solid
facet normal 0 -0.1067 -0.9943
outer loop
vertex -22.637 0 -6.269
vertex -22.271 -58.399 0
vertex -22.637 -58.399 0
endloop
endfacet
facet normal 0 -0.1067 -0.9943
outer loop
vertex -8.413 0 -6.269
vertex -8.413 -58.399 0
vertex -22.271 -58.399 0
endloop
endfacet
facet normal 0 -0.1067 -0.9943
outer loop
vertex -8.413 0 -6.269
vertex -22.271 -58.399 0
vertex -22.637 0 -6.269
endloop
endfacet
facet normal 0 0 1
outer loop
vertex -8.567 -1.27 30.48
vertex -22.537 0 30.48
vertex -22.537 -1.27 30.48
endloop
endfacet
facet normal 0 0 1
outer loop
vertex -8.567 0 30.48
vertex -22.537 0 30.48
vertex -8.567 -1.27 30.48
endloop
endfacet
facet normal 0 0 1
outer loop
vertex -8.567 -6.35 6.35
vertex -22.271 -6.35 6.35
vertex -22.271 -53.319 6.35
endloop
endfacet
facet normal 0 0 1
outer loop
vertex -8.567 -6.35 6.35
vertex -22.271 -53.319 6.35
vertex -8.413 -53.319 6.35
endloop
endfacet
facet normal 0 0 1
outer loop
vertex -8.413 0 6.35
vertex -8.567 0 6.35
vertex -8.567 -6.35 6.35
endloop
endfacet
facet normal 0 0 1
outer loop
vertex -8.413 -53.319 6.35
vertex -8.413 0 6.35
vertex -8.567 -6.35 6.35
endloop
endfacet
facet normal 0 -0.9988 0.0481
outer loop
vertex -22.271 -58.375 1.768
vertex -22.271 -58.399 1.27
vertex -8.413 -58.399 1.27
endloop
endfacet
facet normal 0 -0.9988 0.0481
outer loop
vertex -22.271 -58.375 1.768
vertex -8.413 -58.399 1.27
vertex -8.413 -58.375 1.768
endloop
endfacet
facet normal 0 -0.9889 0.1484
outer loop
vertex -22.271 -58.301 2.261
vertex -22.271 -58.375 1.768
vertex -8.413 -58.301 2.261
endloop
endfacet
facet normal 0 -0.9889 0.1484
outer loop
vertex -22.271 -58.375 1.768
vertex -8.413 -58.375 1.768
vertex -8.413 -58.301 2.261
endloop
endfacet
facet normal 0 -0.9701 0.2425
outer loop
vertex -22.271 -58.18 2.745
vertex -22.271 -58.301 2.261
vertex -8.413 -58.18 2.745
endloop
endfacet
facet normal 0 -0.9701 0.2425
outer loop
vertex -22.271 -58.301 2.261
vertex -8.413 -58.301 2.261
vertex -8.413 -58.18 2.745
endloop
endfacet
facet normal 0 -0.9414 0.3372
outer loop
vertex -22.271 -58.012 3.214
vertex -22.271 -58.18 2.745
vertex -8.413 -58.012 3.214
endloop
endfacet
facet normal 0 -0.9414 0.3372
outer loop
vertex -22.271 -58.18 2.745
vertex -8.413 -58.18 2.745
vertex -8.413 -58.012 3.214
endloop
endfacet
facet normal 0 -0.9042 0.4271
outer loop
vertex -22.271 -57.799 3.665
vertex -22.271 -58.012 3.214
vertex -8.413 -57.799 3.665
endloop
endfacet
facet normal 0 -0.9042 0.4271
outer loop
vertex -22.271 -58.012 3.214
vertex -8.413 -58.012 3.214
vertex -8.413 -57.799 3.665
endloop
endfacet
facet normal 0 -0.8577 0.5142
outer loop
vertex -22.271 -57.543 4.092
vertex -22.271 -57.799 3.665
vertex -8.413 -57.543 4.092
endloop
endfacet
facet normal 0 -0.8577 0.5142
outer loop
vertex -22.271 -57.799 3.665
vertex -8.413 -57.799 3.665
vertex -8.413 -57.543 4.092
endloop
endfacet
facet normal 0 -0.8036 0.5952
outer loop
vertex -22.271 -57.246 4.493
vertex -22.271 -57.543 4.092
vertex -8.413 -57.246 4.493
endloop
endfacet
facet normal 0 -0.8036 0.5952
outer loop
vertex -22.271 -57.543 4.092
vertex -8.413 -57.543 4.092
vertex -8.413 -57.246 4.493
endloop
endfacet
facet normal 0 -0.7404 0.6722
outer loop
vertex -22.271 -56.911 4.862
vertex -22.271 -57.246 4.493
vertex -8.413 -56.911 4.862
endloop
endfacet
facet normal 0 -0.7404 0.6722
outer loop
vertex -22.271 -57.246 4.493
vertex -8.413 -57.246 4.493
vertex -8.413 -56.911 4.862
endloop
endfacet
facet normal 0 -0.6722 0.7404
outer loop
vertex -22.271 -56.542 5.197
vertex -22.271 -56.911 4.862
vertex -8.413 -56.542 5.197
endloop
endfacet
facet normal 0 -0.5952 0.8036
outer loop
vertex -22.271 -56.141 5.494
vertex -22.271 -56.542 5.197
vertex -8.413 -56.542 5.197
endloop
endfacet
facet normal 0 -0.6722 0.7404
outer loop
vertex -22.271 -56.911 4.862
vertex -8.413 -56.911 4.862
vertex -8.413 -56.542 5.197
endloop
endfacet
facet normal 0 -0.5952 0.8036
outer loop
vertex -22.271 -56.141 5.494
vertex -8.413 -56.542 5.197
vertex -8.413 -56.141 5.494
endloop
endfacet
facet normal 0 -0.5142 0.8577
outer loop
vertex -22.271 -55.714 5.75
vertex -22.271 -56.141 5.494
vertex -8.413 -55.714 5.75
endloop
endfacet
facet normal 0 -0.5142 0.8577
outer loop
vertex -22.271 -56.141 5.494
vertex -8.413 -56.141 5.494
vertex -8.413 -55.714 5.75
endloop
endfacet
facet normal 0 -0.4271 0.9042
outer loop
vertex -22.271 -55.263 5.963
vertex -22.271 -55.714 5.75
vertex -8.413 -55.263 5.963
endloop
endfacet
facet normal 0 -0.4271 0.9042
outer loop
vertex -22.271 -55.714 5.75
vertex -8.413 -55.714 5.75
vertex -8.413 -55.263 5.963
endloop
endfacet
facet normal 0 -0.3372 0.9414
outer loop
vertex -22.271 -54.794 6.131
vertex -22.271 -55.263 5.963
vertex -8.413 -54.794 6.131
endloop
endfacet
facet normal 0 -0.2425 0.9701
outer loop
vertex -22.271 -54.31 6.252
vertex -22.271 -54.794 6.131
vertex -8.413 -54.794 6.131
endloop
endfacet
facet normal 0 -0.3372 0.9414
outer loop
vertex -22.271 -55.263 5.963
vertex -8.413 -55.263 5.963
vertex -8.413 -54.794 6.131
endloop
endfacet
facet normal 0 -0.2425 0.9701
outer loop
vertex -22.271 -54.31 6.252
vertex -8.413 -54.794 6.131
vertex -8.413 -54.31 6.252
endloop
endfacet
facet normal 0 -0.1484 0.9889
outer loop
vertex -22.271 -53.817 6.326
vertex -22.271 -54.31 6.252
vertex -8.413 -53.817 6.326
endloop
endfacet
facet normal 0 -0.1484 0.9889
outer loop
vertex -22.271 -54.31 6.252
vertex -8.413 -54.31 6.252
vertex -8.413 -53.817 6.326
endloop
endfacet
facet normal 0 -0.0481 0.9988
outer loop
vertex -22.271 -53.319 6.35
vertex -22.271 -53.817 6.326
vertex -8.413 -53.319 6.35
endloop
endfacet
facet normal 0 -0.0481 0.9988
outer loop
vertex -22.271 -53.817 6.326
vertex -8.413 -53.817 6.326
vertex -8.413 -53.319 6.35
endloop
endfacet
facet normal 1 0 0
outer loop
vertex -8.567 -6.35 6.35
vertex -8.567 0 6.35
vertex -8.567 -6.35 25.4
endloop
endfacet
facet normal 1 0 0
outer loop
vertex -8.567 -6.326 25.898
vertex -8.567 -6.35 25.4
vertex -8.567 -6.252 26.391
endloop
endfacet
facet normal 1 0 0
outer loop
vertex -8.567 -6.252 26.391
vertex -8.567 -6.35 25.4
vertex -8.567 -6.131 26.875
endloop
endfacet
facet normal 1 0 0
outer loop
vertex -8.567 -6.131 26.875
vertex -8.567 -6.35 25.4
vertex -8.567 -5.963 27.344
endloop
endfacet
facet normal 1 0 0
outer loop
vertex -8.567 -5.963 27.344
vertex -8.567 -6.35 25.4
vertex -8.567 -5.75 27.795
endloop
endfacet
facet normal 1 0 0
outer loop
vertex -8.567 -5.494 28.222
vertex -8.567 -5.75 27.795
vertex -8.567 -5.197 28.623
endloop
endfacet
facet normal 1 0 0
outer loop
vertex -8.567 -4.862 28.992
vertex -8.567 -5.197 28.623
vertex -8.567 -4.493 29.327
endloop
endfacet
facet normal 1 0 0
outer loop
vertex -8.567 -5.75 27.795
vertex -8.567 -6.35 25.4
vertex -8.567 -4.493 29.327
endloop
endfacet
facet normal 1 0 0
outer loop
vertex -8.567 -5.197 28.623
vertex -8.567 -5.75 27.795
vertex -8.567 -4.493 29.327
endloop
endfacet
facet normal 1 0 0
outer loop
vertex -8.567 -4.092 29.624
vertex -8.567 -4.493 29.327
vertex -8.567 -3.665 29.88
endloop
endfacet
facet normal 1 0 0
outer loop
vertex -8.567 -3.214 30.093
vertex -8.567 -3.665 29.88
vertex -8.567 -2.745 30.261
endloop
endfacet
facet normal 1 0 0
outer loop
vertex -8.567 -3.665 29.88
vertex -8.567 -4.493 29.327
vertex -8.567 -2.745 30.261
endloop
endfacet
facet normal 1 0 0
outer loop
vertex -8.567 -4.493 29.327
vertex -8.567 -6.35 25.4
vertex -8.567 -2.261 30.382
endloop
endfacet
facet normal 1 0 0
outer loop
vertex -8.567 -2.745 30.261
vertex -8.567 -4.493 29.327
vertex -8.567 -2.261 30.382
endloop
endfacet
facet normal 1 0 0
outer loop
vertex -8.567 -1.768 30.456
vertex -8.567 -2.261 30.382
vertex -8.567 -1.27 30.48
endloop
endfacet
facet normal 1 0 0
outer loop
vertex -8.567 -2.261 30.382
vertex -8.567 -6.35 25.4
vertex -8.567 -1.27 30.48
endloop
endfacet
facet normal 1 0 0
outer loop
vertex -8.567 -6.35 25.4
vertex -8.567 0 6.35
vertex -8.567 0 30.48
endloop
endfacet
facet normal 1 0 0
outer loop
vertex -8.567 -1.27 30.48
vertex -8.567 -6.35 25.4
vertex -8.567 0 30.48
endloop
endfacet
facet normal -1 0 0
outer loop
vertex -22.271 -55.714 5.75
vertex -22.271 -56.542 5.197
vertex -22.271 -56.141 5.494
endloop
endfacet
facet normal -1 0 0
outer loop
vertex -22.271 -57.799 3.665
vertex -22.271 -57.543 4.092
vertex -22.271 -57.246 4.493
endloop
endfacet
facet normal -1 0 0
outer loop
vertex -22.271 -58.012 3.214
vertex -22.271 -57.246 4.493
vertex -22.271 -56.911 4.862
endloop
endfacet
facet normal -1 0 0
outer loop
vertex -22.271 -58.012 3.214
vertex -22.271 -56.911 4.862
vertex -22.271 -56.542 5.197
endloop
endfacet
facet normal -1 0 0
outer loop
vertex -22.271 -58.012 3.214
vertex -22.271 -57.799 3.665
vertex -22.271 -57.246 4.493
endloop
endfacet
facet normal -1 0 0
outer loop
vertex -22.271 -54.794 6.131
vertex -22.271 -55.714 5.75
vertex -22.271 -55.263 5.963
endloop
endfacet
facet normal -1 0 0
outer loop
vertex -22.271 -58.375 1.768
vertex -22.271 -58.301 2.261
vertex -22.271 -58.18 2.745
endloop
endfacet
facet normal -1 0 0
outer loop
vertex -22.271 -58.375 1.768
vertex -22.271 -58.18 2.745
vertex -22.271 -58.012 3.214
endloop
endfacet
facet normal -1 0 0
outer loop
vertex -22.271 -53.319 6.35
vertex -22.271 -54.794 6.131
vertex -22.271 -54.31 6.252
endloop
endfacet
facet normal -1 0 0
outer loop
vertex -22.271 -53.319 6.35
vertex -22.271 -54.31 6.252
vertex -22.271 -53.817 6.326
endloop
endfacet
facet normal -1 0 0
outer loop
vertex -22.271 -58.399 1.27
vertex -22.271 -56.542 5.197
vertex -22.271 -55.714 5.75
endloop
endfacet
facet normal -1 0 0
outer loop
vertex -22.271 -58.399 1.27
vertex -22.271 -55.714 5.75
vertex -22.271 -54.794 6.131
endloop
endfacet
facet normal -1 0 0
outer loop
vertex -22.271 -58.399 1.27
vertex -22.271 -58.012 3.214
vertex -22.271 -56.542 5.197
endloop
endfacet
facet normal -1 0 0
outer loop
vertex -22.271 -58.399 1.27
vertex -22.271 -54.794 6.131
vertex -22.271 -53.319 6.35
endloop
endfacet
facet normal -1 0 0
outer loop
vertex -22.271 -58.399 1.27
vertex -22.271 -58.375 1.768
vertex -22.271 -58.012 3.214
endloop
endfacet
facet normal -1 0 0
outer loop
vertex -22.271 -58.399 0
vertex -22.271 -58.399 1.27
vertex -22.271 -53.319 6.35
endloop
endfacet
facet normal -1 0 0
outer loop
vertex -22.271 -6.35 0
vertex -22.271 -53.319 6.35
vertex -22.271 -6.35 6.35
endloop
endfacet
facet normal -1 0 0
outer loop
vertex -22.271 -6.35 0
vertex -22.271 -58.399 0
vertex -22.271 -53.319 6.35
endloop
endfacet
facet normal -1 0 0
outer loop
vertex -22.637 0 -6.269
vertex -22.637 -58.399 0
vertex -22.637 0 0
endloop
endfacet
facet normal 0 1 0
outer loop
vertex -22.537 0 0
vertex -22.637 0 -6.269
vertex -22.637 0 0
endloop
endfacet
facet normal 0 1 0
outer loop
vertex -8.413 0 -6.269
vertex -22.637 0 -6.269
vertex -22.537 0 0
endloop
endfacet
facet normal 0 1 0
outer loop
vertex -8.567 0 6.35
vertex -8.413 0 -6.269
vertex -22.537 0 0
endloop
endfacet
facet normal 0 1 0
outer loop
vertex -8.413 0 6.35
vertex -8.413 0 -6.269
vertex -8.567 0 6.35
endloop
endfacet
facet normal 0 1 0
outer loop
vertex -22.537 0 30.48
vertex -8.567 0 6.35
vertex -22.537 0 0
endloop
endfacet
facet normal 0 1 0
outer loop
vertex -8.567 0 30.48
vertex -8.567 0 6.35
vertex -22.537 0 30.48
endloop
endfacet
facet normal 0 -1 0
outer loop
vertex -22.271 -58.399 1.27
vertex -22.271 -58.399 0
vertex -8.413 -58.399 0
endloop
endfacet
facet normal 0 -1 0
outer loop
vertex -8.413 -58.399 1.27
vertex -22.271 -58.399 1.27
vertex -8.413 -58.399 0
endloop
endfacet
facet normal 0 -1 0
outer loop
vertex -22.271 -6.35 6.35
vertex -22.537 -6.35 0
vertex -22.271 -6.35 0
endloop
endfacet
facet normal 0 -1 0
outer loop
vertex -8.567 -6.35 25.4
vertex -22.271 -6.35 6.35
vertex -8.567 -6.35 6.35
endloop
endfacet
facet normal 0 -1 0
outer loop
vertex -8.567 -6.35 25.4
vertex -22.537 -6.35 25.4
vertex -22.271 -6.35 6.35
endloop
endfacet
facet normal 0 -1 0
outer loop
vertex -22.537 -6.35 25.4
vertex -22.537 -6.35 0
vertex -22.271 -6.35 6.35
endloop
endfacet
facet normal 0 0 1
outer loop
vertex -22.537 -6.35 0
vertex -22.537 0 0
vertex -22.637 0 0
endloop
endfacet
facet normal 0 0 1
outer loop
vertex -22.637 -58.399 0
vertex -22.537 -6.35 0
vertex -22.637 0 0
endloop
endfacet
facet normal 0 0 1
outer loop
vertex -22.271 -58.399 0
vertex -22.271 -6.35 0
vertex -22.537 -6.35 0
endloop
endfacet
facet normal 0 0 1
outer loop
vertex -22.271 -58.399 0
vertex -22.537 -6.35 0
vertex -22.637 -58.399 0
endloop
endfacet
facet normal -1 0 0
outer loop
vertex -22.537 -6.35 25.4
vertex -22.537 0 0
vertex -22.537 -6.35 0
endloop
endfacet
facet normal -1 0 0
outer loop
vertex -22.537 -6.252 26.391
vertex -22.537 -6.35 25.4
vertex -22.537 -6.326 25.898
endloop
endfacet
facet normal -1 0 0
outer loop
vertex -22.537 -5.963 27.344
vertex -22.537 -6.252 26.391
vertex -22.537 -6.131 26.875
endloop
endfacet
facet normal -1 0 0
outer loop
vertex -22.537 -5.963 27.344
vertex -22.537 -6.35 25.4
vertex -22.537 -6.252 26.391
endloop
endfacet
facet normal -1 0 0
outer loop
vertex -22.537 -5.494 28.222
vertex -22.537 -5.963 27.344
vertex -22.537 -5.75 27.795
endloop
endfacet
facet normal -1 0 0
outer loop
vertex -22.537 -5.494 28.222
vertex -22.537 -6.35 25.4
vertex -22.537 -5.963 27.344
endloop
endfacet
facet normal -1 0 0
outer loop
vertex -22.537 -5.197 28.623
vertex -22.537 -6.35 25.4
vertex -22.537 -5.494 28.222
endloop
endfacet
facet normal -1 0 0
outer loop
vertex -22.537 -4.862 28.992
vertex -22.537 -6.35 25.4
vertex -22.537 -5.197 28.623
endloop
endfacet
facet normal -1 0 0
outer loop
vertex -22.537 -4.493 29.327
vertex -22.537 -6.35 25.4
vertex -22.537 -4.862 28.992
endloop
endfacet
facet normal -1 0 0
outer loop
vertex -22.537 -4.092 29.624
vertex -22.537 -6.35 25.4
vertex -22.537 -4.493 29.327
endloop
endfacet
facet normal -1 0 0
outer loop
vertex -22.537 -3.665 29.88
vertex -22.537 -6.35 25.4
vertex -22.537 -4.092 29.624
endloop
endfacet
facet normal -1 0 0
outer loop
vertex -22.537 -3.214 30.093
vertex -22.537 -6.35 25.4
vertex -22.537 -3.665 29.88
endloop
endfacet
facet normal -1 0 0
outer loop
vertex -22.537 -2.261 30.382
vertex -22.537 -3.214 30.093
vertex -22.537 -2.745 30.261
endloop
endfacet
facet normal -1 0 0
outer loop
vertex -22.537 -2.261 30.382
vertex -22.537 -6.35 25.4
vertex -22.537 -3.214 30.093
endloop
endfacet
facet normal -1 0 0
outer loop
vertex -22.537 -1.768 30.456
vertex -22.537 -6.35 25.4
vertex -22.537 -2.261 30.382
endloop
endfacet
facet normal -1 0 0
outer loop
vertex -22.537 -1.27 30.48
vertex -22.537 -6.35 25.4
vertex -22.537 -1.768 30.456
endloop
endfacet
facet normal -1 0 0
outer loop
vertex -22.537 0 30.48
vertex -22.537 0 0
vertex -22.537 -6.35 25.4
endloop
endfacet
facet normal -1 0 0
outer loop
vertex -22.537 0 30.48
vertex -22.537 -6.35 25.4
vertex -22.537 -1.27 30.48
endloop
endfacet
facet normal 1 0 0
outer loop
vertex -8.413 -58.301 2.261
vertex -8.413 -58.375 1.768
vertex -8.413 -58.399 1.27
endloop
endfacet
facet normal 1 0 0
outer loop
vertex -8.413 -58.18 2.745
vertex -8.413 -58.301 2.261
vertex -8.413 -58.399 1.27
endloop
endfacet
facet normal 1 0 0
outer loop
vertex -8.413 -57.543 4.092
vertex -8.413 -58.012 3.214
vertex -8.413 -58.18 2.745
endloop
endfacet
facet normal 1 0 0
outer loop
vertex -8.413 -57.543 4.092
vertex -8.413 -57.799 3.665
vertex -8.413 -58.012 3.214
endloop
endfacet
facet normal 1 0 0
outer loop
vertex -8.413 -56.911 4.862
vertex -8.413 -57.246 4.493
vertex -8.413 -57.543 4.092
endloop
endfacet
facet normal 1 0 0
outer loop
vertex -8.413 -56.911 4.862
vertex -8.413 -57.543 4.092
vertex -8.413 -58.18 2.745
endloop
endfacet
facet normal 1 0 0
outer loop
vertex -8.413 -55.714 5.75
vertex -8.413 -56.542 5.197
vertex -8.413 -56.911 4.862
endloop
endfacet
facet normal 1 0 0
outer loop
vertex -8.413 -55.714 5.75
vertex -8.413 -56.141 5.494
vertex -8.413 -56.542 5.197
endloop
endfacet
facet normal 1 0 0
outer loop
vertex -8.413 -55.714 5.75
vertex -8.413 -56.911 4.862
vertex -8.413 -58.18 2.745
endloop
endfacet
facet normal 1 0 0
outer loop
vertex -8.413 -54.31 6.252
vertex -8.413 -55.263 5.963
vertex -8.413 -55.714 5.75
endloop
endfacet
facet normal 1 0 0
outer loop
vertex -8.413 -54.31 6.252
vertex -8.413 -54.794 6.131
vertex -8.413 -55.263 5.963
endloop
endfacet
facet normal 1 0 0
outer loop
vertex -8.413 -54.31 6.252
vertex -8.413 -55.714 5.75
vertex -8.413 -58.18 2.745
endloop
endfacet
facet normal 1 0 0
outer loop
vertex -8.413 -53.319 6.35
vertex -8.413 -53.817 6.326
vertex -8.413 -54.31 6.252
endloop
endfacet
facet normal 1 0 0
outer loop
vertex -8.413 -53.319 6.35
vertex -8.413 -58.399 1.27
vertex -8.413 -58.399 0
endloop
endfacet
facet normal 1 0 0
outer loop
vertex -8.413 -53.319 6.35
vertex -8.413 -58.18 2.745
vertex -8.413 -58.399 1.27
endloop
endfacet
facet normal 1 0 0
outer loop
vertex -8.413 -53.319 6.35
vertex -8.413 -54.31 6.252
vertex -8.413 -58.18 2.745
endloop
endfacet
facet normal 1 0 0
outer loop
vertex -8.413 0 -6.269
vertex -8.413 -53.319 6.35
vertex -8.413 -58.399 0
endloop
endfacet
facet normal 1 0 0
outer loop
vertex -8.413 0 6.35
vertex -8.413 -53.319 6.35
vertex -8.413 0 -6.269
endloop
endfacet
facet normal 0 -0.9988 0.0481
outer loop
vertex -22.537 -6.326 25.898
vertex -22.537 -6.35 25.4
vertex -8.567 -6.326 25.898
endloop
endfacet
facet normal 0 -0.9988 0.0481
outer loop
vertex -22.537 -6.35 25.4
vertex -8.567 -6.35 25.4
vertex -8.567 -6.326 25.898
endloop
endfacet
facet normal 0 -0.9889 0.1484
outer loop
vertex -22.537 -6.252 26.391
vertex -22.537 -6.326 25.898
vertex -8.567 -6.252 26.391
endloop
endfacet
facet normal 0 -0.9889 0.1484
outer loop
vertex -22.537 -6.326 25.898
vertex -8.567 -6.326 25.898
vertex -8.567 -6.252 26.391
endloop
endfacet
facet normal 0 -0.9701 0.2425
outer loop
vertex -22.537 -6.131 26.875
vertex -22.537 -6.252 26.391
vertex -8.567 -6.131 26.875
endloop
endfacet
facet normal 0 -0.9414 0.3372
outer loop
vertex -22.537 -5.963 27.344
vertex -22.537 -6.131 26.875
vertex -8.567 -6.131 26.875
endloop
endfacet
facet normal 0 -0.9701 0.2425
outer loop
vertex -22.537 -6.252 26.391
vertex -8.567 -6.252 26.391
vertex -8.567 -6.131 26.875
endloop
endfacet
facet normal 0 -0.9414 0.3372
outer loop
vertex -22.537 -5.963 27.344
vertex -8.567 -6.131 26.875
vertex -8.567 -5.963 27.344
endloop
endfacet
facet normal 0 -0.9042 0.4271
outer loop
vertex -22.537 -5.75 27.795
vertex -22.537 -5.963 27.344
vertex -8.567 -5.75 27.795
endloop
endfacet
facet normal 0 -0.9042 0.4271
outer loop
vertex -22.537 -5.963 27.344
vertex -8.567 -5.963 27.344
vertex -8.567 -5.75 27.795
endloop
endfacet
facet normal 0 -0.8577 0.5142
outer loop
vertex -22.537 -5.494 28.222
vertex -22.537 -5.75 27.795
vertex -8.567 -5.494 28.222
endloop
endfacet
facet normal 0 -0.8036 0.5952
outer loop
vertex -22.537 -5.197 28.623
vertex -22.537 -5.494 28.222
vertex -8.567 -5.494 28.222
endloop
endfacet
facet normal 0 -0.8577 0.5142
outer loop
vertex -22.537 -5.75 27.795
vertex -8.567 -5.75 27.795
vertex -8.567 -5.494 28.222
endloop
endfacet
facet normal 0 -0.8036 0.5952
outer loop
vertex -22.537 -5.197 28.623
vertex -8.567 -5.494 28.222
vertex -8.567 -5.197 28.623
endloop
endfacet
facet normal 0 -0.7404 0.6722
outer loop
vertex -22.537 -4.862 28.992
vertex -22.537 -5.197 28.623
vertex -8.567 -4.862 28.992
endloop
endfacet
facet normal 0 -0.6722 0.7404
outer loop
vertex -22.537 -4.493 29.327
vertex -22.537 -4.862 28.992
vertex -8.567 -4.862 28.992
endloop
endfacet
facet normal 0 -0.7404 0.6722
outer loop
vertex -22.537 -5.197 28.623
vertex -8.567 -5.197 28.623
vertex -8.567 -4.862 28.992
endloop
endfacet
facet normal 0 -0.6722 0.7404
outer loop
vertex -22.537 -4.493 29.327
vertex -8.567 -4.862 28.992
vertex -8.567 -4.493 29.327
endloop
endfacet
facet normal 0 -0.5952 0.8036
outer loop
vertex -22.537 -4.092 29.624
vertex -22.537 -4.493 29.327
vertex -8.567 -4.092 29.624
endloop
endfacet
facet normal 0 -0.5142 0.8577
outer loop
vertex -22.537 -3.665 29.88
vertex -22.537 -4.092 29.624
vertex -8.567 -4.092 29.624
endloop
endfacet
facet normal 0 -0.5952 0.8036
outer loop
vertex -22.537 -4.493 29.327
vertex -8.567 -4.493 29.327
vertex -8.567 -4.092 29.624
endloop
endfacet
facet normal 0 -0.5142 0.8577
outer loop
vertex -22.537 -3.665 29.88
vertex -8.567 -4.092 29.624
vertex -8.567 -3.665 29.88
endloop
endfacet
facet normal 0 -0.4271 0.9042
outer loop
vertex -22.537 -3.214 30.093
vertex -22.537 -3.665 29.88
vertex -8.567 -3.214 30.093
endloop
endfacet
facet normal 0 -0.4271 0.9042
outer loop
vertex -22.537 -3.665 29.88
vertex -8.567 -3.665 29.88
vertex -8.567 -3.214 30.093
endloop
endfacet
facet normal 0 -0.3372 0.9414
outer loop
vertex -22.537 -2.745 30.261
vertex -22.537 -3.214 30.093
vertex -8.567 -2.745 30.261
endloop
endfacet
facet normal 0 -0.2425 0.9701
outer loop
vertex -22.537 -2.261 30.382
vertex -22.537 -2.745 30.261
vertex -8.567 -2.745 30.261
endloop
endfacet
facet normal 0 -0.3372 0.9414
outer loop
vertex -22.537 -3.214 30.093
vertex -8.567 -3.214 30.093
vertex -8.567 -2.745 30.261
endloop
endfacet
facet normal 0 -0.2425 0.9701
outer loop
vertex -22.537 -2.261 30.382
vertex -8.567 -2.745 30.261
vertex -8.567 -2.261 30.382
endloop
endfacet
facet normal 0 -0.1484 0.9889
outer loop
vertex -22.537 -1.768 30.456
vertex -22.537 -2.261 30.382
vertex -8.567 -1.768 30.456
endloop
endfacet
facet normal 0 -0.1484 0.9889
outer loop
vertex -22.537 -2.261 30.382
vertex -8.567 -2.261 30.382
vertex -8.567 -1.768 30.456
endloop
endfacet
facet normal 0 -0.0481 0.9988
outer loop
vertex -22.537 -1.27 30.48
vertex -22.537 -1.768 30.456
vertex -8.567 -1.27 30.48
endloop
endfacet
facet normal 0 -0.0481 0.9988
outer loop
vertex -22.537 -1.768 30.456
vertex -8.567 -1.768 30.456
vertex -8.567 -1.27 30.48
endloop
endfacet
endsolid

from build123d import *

# Parameters (mm, degrees)
F1_W     = 13.8574047014
F1_H     = 58.3990514278
F2_DEPTH = 6.35
F0_W     = 13.97
F0_H     = 30.48
F3_DEPTH = 6.35
F4_R     = 5.08
F6_DEPTH = 14.224


with BuildPart() as f2:
    # F1 (on Top) → F2 (new body)
    with BuildSketch(Plane.XY):
        with Locations((-15.3421224095, -29.1995257139)):
            Rectangle(F1_W, F1_H)
    extrude(amount=F2_DEPTH)

    # F0 (on Front) → F3 (join)
    with BuildSketch(Plane.XZ):
        with Locations((-15.5518442771, 15.24)):
            Rectangle(F0_W, F0_H)
    extrude(amount=F3_DEPTH)

    # F4
    f4_edges = [f2.edges().sort_by_distance(p)[0] for p in [
        (-15.342122, -58.399051, 6.35),
        (-15.551844, -6.35, 30.48),
    ]]
    fillet(f4_edges, radius=F4_R)

    # F5 (on face) → F6 (join)
    with BuildSketch(Plane.YZ.offset(-8.4134200588)):
        Polygon((0, 0), (-58.3990514278, 0), (0, -6.2688249163), align=None)
    extrude(amount=-F6_DEPTH)


solid = f2.part
